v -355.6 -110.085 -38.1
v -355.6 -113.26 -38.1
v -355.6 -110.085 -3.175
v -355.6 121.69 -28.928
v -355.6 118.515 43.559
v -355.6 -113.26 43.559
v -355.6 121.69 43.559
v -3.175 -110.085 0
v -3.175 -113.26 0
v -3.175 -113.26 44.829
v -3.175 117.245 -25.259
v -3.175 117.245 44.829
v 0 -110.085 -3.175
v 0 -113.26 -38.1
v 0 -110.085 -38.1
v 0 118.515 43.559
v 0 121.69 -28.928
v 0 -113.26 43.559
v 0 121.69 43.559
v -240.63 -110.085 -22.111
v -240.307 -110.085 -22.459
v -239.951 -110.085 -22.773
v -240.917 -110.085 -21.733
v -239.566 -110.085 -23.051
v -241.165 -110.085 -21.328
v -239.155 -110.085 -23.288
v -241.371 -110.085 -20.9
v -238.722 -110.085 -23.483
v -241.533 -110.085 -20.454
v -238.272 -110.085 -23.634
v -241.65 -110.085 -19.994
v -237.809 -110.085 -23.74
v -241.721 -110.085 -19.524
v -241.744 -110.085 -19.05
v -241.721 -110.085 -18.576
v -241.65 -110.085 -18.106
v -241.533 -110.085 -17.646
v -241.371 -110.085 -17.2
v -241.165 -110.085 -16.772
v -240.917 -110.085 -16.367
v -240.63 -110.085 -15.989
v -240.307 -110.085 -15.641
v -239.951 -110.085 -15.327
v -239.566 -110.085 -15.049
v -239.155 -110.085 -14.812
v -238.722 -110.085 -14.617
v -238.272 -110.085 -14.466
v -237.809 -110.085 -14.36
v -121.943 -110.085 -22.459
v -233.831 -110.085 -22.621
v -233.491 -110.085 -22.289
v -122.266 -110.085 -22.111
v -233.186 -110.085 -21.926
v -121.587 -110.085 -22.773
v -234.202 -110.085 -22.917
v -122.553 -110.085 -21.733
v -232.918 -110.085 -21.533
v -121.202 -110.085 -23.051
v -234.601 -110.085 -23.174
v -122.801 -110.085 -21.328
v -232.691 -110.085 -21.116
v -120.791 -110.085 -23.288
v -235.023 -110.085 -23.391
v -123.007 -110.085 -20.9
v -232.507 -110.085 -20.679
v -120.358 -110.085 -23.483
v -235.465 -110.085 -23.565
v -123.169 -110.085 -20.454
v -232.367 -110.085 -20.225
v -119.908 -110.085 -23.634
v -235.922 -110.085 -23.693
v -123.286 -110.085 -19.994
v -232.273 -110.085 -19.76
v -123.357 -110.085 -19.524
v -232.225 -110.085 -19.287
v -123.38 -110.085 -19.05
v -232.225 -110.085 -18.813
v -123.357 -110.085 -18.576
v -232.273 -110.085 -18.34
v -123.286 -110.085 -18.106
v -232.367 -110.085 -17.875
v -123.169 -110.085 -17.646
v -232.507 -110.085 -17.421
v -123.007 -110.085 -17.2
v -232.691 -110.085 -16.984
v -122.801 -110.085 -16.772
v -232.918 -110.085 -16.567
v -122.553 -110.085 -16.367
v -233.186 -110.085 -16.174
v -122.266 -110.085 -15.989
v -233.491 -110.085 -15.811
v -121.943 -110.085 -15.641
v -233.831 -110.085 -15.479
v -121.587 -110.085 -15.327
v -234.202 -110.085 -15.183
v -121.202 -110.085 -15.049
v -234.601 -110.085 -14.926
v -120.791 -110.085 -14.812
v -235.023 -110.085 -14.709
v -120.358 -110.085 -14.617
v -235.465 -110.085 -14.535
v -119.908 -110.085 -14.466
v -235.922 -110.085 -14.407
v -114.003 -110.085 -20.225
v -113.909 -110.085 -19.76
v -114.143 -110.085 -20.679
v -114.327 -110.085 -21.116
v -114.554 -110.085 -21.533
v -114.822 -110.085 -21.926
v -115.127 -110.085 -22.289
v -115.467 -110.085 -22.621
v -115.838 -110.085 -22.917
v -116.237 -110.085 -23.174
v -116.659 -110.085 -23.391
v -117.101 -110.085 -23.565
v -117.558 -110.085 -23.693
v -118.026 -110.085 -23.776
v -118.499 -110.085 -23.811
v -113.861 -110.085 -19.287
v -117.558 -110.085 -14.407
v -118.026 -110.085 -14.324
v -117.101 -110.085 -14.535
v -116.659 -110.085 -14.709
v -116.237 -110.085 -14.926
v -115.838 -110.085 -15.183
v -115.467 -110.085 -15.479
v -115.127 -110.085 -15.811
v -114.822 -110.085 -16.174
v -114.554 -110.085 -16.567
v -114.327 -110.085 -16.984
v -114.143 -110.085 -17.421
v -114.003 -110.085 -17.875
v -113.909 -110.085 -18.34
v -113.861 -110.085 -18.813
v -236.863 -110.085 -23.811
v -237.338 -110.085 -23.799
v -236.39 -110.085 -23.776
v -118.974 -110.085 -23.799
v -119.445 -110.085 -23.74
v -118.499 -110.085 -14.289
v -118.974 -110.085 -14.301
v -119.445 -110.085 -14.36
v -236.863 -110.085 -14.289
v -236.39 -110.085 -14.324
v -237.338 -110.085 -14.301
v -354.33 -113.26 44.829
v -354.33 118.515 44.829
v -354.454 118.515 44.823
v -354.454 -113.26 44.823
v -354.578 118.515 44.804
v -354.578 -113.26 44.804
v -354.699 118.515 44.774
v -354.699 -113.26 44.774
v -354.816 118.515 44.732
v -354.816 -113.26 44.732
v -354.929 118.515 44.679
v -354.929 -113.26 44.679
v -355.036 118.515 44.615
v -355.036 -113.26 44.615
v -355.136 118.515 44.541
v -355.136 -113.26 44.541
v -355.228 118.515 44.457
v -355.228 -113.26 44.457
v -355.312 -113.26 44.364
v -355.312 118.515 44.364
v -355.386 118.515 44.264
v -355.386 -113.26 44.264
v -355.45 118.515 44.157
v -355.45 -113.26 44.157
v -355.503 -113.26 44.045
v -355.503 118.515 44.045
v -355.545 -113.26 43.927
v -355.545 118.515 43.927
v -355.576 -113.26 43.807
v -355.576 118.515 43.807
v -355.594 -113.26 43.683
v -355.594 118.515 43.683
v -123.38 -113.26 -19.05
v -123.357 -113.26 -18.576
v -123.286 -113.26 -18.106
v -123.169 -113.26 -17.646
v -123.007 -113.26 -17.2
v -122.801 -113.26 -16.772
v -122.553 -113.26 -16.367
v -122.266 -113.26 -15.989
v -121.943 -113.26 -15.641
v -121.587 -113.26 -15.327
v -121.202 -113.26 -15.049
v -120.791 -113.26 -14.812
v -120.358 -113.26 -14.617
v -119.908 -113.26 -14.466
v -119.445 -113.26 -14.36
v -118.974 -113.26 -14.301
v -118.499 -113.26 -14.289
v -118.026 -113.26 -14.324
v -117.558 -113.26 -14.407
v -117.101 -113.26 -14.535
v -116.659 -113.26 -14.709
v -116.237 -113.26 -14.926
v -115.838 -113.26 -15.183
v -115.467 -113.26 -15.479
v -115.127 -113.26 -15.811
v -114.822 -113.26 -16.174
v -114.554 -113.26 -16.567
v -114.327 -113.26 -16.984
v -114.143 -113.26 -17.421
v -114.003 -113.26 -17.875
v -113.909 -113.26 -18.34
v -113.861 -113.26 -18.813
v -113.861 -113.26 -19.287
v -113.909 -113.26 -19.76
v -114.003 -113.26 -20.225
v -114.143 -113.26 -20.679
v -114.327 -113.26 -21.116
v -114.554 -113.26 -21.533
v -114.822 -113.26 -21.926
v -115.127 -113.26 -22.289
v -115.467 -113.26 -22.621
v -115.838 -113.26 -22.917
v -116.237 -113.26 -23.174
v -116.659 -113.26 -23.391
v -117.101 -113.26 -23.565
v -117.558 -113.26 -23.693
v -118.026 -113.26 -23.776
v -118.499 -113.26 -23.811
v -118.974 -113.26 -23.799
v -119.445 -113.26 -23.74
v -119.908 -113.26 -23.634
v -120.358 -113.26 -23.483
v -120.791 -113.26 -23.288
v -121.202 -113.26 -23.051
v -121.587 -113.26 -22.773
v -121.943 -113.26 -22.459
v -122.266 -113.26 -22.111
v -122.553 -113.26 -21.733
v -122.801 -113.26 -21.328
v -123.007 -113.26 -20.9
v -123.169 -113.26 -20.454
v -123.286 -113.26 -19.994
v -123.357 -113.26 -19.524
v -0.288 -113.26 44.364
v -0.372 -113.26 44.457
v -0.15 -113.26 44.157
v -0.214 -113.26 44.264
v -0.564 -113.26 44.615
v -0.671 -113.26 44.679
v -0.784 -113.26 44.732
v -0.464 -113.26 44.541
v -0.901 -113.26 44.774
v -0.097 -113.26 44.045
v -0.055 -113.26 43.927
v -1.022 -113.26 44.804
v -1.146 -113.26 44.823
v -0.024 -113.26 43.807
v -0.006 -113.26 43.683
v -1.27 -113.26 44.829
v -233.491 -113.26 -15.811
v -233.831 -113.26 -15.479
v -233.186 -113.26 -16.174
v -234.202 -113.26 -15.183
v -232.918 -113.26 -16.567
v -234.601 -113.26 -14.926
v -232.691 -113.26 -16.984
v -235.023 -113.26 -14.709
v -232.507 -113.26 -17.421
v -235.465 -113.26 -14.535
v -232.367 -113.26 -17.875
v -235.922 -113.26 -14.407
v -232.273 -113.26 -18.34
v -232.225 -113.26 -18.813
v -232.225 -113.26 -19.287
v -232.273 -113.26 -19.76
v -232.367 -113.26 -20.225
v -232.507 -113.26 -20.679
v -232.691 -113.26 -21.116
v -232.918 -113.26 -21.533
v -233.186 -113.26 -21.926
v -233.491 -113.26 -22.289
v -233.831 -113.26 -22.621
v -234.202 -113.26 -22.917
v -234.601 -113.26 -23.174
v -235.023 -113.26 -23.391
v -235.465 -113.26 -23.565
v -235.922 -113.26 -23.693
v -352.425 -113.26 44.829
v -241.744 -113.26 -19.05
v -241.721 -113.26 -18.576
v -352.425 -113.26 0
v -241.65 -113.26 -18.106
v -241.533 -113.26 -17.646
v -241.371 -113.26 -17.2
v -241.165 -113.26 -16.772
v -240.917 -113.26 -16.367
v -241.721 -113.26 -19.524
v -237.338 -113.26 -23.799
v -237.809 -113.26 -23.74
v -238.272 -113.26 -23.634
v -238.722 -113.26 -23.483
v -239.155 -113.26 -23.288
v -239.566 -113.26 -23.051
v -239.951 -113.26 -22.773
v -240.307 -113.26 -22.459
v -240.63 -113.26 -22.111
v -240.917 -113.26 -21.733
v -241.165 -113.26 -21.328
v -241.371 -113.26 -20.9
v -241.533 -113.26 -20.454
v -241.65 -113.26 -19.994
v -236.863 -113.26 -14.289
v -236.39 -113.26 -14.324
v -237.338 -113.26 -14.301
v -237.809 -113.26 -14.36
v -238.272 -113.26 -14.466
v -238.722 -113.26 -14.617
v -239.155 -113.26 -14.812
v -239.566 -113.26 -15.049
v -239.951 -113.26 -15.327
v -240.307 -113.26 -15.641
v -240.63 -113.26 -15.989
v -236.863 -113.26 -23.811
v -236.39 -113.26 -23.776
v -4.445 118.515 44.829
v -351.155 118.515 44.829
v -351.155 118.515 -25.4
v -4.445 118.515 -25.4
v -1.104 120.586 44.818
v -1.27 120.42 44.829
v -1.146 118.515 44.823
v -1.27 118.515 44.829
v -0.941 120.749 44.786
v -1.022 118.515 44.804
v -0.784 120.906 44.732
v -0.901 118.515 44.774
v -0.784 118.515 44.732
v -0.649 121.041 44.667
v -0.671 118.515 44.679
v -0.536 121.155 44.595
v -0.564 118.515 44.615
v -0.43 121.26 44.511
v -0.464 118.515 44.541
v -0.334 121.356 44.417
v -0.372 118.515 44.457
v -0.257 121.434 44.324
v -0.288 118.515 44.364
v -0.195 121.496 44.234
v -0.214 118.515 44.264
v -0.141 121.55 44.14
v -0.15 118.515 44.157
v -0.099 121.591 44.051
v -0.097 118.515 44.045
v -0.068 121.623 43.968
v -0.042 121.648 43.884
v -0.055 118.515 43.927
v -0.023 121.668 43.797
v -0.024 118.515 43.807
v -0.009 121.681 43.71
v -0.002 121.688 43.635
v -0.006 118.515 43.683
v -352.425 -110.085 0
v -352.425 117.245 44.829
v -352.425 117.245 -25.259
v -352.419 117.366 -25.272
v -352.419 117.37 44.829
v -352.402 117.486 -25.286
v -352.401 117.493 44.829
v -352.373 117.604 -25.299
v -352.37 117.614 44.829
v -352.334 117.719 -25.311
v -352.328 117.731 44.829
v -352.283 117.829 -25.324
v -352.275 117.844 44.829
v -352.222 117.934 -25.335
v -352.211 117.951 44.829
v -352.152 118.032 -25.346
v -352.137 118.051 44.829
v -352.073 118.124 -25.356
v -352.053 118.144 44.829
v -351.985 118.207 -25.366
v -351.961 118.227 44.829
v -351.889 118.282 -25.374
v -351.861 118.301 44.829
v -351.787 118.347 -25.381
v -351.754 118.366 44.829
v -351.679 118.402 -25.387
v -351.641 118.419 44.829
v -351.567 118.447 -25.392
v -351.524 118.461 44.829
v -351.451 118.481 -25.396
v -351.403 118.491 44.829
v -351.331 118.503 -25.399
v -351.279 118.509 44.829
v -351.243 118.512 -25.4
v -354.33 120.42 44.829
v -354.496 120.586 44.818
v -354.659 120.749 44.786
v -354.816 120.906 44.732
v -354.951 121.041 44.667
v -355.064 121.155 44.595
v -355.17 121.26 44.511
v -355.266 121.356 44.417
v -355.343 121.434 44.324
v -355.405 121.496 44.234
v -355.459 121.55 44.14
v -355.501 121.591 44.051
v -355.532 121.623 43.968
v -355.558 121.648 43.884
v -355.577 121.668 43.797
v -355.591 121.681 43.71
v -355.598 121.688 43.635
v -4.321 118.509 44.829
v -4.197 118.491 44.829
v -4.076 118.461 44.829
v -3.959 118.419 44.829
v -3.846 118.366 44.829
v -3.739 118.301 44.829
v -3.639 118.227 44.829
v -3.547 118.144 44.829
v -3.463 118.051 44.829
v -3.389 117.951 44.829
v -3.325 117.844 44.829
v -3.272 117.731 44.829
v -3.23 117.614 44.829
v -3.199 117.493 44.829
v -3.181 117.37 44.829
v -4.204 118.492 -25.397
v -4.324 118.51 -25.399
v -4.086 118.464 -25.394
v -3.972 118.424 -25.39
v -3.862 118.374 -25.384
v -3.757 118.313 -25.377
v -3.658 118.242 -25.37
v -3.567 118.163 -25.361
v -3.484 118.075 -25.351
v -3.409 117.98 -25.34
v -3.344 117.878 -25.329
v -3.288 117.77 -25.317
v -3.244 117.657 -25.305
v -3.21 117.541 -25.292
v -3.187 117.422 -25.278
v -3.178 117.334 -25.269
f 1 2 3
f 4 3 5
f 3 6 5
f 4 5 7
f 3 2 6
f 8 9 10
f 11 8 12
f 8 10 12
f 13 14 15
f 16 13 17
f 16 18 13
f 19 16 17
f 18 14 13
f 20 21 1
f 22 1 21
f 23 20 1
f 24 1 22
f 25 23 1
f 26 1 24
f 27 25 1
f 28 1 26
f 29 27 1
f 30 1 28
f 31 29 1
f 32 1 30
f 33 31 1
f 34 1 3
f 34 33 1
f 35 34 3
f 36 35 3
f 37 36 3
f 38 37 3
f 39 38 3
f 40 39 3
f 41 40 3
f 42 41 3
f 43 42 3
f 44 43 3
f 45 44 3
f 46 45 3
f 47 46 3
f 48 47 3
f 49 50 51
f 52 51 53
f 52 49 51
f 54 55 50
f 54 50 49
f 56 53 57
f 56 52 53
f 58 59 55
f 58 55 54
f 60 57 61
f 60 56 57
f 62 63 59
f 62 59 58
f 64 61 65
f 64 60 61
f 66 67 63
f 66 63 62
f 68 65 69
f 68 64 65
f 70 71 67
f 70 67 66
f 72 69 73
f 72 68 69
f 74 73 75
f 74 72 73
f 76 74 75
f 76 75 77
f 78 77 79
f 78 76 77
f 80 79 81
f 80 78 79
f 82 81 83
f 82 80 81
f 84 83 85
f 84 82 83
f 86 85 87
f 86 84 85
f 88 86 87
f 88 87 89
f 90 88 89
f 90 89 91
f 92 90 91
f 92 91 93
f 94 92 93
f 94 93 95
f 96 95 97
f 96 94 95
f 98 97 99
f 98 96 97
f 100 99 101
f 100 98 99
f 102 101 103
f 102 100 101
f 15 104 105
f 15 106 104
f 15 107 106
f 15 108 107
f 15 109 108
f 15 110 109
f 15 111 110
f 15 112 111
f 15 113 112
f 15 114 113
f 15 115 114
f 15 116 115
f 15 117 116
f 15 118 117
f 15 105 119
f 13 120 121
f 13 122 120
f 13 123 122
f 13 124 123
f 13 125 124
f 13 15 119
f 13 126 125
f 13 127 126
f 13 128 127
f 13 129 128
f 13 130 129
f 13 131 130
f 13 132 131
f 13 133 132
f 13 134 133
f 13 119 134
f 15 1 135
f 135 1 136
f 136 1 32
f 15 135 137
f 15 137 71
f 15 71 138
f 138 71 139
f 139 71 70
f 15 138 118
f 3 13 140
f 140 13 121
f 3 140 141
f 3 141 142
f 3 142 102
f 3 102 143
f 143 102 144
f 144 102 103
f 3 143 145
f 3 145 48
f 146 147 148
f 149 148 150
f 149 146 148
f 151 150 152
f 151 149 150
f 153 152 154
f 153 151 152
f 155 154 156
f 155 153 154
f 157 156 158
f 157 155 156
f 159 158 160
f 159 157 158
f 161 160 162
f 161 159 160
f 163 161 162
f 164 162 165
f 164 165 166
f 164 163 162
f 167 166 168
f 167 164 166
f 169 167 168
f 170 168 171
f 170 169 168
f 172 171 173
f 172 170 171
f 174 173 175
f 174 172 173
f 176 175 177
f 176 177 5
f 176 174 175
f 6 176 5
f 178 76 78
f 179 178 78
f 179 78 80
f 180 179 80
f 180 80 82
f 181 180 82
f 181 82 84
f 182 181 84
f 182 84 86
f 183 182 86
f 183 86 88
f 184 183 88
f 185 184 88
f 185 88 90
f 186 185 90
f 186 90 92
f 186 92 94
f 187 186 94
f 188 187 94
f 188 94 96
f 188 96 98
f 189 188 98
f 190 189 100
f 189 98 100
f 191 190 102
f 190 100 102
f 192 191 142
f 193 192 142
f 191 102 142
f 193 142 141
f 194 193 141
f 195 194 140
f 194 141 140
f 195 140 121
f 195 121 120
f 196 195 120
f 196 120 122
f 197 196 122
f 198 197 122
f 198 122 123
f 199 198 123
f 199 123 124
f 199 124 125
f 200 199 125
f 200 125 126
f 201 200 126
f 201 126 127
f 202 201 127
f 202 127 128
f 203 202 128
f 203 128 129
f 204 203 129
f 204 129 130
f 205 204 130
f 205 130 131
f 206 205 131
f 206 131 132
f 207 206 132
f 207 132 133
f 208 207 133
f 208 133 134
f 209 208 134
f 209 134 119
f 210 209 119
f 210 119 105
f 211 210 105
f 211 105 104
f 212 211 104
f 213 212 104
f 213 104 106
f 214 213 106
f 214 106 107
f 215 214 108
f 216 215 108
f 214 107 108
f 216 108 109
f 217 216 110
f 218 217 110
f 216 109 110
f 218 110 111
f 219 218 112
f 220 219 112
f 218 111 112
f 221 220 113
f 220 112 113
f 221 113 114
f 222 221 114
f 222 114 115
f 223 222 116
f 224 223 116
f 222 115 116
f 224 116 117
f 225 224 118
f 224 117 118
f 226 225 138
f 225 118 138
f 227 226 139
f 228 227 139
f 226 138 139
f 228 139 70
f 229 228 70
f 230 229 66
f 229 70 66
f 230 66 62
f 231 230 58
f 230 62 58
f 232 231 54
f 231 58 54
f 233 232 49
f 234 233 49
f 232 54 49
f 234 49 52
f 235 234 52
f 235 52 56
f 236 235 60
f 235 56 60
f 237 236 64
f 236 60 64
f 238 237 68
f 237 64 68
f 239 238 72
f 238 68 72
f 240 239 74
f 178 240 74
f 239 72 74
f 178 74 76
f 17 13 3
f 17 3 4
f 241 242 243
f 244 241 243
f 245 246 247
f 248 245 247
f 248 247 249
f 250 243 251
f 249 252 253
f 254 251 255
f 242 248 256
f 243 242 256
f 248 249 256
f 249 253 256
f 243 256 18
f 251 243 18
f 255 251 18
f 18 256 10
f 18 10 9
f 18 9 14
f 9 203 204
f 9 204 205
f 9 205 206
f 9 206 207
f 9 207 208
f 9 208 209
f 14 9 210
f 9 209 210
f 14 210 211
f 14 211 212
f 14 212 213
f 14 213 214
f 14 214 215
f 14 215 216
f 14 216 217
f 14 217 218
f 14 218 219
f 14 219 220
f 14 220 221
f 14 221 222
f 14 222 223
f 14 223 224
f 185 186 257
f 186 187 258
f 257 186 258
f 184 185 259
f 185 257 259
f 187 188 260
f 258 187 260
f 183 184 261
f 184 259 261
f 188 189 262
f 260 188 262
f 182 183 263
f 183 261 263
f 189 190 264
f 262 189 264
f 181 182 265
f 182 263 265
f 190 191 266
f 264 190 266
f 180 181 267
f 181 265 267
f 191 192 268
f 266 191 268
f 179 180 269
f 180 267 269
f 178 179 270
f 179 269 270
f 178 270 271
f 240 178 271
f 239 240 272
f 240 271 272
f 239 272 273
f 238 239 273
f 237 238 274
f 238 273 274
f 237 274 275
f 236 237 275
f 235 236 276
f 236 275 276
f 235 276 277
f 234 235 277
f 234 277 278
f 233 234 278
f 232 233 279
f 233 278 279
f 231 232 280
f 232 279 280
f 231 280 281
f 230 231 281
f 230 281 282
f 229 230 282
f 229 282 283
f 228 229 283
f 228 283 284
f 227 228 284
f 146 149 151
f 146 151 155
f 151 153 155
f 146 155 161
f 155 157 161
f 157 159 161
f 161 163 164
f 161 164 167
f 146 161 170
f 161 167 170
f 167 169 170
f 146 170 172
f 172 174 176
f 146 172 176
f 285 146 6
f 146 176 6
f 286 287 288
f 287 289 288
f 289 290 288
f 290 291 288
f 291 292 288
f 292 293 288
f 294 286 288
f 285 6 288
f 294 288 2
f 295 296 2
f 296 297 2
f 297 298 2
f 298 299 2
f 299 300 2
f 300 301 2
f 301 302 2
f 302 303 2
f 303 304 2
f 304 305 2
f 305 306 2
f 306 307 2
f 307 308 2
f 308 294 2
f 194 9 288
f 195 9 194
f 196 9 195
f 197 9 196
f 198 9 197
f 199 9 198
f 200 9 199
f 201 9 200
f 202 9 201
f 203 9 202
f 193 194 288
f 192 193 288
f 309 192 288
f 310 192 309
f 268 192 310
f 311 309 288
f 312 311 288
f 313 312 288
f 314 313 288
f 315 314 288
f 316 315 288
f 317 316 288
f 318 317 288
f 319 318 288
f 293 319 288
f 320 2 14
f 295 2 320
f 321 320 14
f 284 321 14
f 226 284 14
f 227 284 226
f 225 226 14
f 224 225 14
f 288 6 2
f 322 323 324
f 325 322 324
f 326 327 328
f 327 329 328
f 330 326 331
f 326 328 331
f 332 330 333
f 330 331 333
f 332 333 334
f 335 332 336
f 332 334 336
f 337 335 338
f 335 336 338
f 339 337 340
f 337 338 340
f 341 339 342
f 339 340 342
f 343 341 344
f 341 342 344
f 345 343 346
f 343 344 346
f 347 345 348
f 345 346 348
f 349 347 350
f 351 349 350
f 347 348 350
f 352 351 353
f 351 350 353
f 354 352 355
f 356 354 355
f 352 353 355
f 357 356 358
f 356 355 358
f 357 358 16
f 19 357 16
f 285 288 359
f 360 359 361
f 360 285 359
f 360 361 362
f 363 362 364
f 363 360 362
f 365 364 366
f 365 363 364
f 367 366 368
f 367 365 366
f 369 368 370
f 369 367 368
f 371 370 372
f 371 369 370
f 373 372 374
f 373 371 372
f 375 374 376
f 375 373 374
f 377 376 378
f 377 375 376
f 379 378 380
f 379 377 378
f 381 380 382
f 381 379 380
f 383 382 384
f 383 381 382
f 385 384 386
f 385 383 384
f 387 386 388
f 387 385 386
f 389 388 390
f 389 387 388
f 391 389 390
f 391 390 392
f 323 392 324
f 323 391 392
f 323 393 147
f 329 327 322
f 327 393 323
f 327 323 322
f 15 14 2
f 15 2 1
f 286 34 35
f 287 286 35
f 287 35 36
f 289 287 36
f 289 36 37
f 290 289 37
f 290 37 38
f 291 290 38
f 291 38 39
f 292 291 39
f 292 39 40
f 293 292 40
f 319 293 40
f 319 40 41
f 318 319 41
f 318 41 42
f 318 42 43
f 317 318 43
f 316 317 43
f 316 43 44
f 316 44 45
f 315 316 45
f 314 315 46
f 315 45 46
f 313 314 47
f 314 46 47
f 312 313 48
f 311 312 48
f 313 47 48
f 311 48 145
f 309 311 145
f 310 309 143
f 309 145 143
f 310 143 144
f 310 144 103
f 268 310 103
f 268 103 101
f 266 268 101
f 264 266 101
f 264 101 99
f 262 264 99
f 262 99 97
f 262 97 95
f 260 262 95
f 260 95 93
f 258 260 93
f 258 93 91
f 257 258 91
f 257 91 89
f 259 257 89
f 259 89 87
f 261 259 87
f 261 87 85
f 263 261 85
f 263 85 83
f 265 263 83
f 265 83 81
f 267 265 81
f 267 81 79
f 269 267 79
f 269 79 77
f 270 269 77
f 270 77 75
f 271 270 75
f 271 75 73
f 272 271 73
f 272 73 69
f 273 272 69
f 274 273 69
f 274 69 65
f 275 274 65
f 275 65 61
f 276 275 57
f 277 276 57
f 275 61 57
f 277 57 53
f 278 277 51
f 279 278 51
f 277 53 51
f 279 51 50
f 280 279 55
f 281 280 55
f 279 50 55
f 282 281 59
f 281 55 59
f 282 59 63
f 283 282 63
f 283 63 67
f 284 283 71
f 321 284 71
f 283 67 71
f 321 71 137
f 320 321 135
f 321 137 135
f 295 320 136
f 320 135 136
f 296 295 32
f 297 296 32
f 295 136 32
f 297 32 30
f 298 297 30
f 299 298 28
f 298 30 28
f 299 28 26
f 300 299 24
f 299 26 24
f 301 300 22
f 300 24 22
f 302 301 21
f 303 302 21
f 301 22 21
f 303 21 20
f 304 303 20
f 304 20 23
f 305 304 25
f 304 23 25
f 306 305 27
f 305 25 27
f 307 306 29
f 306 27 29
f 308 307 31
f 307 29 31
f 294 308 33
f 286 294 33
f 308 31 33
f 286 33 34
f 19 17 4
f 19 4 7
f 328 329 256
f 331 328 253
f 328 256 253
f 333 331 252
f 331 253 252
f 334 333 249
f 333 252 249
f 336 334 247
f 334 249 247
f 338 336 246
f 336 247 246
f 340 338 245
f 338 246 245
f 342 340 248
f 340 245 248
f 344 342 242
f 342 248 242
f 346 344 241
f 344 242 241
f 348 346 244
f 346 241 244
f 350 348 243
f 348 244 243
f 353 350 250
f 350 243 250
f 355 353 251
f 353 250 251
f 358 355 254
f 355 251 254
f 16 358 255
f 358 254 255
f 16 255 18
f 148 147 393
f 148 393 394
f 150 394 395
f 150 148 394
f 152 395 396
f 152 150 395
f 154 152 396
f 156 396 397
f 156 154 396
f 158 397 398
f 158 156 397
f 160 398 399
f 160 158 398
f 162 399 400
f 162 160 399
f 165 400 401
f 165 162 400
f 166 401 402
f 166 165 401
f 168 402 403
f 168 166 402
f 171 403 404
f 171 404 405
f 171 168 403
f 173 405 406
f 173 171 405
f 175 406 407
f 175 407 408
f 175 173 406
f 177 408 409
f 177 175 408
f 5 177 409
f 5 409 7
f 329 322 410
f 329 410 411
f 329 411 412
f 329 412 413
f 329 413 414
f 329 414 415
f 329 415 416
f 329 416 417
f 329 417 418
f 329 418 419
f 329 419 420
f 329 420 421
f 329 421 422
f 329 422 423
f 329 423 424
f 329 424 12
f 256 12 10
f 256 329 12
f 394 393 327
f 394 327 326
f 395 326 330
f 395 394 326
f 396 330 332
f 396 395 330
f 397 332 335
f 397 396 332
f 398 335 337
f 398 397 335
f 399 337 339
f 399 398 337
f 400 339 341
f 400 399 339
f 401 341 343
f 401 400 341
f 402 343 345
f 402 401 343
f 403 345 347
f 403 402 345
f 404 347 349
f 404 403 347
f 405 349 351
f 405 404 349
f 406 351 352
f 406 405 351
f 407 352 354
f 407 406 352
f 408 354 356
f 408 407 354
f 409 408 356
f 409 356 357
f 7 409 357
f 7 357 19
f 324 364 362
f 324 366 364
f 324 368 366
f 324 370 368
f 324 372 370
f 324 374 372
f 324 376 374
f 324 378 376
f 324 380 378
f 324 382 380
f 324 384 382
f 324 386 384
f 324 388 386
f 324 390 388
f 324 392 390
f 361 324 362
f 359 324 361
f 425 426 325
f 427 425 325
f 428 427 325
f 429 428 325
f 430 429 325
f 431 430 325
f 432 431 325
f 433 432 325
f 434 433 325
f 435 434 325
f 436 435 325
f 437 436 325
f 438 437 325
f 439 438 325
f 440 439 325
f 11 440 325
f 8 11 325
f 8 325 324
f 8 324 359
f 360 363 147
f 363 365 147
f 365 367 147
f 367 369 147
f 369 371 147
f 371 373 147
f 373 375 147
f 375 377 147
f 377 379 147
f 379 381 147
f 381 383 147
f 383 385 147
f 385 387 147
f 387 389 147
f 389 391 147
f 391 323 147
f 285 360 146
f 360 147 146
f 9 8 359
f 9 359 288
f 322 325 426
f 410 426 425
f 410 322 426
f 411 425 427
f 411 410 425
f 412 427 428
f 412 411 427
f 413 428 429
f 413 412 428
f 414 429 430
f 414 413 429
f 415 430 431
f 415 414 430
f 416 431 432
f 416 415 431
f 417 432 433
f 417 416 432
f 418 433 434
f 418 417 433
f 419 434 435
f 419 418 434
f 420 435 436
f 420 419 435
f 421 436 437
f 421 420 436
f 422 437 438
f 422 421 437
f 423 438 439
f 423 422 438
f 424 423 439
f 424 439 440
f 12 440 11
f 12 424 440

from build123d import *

# Parameters (mm, degrees)
F1_DEPTH = 355.6
F3_DEPTH = 3.175
F6_DEPTH = 3.175
F8_D     = 9.525
F8_DEPTH = 5.08
F8_TIP   = 2.8615986981
F9_R     = 1.27


with BuildPart() as f1:
    # F0 (on Right) → F1 (new body)
    with BuildSketch(Plane.YZ):
        Polygon((118.5154446509, -25.4), (-110.0845239475, 0), (-110.0845239475, -3.175), (121.6904760525, -28.9277813153), (121.6904760525, 44.8288065905), (118.5154760525, 44.8288080101), align=None)
        Polygon((-110.0845239475, -3.175), (-110.0845239475, 0), (-113.2595239475, 0), (-113.2595239475, -38.1), (-110.0845239475, -38.1), align=None)
    extrude(amount=-F1_DEPTH)

    # F2 (on Right) → F3 (join)
    with BuildSketch(Plane.YZ):
        Polygon((-113.2595239475, 44.8288080101), (-113.2595239475, 0), (-110.0845239475, 0), (118.5154446509, -25.4), (118.5154760525, 44.8288080101), align=None)
    extrude(amount=-F3_DEPTH)

    # F5 (on offset) → F6 (join)
    with BuildSketch(Plane.YZ.offset(-355.6)):
        Polygon((118.5154760525, 44.8288080101), (-113.2595239475, 44.8288080101), (-113.2595239475, 0), (-110.0845239475, 0), (118.5154446509, -25.4), align=None)
    extrude(amount=F6_DEPTH)

    # F8
    with Locations(Plane.XZ.offset(113.2595239475)):
        with Locations((-236.982, -19.05), (-118.618, -19.05)):
            Hole(F8_D / 2, depth=F8_DEPTH)
            with Locations((0, 0, -(F8_DEPTH + F8_TIP / 2))):  # 118° drill point
                Cone(0, F8_D / 2, F8_TIP, mode=Mode.SUBTRACT)

    # F9
    f9_edges = [f1.edges().sort_by_distance(p)[0] for p in [
        (-352.425, 118.51546, 9.714404),
        (-3.175, 118.51546, 9.714404),
        (-355.6, 2.627976, 44.828808),
        (0, 2.627976, 44.828808),
        (-177.8, 121.690476, 44.828807),
    ]]
    fillet(f9_edges, radius=F9_R)


solid = f1.part
